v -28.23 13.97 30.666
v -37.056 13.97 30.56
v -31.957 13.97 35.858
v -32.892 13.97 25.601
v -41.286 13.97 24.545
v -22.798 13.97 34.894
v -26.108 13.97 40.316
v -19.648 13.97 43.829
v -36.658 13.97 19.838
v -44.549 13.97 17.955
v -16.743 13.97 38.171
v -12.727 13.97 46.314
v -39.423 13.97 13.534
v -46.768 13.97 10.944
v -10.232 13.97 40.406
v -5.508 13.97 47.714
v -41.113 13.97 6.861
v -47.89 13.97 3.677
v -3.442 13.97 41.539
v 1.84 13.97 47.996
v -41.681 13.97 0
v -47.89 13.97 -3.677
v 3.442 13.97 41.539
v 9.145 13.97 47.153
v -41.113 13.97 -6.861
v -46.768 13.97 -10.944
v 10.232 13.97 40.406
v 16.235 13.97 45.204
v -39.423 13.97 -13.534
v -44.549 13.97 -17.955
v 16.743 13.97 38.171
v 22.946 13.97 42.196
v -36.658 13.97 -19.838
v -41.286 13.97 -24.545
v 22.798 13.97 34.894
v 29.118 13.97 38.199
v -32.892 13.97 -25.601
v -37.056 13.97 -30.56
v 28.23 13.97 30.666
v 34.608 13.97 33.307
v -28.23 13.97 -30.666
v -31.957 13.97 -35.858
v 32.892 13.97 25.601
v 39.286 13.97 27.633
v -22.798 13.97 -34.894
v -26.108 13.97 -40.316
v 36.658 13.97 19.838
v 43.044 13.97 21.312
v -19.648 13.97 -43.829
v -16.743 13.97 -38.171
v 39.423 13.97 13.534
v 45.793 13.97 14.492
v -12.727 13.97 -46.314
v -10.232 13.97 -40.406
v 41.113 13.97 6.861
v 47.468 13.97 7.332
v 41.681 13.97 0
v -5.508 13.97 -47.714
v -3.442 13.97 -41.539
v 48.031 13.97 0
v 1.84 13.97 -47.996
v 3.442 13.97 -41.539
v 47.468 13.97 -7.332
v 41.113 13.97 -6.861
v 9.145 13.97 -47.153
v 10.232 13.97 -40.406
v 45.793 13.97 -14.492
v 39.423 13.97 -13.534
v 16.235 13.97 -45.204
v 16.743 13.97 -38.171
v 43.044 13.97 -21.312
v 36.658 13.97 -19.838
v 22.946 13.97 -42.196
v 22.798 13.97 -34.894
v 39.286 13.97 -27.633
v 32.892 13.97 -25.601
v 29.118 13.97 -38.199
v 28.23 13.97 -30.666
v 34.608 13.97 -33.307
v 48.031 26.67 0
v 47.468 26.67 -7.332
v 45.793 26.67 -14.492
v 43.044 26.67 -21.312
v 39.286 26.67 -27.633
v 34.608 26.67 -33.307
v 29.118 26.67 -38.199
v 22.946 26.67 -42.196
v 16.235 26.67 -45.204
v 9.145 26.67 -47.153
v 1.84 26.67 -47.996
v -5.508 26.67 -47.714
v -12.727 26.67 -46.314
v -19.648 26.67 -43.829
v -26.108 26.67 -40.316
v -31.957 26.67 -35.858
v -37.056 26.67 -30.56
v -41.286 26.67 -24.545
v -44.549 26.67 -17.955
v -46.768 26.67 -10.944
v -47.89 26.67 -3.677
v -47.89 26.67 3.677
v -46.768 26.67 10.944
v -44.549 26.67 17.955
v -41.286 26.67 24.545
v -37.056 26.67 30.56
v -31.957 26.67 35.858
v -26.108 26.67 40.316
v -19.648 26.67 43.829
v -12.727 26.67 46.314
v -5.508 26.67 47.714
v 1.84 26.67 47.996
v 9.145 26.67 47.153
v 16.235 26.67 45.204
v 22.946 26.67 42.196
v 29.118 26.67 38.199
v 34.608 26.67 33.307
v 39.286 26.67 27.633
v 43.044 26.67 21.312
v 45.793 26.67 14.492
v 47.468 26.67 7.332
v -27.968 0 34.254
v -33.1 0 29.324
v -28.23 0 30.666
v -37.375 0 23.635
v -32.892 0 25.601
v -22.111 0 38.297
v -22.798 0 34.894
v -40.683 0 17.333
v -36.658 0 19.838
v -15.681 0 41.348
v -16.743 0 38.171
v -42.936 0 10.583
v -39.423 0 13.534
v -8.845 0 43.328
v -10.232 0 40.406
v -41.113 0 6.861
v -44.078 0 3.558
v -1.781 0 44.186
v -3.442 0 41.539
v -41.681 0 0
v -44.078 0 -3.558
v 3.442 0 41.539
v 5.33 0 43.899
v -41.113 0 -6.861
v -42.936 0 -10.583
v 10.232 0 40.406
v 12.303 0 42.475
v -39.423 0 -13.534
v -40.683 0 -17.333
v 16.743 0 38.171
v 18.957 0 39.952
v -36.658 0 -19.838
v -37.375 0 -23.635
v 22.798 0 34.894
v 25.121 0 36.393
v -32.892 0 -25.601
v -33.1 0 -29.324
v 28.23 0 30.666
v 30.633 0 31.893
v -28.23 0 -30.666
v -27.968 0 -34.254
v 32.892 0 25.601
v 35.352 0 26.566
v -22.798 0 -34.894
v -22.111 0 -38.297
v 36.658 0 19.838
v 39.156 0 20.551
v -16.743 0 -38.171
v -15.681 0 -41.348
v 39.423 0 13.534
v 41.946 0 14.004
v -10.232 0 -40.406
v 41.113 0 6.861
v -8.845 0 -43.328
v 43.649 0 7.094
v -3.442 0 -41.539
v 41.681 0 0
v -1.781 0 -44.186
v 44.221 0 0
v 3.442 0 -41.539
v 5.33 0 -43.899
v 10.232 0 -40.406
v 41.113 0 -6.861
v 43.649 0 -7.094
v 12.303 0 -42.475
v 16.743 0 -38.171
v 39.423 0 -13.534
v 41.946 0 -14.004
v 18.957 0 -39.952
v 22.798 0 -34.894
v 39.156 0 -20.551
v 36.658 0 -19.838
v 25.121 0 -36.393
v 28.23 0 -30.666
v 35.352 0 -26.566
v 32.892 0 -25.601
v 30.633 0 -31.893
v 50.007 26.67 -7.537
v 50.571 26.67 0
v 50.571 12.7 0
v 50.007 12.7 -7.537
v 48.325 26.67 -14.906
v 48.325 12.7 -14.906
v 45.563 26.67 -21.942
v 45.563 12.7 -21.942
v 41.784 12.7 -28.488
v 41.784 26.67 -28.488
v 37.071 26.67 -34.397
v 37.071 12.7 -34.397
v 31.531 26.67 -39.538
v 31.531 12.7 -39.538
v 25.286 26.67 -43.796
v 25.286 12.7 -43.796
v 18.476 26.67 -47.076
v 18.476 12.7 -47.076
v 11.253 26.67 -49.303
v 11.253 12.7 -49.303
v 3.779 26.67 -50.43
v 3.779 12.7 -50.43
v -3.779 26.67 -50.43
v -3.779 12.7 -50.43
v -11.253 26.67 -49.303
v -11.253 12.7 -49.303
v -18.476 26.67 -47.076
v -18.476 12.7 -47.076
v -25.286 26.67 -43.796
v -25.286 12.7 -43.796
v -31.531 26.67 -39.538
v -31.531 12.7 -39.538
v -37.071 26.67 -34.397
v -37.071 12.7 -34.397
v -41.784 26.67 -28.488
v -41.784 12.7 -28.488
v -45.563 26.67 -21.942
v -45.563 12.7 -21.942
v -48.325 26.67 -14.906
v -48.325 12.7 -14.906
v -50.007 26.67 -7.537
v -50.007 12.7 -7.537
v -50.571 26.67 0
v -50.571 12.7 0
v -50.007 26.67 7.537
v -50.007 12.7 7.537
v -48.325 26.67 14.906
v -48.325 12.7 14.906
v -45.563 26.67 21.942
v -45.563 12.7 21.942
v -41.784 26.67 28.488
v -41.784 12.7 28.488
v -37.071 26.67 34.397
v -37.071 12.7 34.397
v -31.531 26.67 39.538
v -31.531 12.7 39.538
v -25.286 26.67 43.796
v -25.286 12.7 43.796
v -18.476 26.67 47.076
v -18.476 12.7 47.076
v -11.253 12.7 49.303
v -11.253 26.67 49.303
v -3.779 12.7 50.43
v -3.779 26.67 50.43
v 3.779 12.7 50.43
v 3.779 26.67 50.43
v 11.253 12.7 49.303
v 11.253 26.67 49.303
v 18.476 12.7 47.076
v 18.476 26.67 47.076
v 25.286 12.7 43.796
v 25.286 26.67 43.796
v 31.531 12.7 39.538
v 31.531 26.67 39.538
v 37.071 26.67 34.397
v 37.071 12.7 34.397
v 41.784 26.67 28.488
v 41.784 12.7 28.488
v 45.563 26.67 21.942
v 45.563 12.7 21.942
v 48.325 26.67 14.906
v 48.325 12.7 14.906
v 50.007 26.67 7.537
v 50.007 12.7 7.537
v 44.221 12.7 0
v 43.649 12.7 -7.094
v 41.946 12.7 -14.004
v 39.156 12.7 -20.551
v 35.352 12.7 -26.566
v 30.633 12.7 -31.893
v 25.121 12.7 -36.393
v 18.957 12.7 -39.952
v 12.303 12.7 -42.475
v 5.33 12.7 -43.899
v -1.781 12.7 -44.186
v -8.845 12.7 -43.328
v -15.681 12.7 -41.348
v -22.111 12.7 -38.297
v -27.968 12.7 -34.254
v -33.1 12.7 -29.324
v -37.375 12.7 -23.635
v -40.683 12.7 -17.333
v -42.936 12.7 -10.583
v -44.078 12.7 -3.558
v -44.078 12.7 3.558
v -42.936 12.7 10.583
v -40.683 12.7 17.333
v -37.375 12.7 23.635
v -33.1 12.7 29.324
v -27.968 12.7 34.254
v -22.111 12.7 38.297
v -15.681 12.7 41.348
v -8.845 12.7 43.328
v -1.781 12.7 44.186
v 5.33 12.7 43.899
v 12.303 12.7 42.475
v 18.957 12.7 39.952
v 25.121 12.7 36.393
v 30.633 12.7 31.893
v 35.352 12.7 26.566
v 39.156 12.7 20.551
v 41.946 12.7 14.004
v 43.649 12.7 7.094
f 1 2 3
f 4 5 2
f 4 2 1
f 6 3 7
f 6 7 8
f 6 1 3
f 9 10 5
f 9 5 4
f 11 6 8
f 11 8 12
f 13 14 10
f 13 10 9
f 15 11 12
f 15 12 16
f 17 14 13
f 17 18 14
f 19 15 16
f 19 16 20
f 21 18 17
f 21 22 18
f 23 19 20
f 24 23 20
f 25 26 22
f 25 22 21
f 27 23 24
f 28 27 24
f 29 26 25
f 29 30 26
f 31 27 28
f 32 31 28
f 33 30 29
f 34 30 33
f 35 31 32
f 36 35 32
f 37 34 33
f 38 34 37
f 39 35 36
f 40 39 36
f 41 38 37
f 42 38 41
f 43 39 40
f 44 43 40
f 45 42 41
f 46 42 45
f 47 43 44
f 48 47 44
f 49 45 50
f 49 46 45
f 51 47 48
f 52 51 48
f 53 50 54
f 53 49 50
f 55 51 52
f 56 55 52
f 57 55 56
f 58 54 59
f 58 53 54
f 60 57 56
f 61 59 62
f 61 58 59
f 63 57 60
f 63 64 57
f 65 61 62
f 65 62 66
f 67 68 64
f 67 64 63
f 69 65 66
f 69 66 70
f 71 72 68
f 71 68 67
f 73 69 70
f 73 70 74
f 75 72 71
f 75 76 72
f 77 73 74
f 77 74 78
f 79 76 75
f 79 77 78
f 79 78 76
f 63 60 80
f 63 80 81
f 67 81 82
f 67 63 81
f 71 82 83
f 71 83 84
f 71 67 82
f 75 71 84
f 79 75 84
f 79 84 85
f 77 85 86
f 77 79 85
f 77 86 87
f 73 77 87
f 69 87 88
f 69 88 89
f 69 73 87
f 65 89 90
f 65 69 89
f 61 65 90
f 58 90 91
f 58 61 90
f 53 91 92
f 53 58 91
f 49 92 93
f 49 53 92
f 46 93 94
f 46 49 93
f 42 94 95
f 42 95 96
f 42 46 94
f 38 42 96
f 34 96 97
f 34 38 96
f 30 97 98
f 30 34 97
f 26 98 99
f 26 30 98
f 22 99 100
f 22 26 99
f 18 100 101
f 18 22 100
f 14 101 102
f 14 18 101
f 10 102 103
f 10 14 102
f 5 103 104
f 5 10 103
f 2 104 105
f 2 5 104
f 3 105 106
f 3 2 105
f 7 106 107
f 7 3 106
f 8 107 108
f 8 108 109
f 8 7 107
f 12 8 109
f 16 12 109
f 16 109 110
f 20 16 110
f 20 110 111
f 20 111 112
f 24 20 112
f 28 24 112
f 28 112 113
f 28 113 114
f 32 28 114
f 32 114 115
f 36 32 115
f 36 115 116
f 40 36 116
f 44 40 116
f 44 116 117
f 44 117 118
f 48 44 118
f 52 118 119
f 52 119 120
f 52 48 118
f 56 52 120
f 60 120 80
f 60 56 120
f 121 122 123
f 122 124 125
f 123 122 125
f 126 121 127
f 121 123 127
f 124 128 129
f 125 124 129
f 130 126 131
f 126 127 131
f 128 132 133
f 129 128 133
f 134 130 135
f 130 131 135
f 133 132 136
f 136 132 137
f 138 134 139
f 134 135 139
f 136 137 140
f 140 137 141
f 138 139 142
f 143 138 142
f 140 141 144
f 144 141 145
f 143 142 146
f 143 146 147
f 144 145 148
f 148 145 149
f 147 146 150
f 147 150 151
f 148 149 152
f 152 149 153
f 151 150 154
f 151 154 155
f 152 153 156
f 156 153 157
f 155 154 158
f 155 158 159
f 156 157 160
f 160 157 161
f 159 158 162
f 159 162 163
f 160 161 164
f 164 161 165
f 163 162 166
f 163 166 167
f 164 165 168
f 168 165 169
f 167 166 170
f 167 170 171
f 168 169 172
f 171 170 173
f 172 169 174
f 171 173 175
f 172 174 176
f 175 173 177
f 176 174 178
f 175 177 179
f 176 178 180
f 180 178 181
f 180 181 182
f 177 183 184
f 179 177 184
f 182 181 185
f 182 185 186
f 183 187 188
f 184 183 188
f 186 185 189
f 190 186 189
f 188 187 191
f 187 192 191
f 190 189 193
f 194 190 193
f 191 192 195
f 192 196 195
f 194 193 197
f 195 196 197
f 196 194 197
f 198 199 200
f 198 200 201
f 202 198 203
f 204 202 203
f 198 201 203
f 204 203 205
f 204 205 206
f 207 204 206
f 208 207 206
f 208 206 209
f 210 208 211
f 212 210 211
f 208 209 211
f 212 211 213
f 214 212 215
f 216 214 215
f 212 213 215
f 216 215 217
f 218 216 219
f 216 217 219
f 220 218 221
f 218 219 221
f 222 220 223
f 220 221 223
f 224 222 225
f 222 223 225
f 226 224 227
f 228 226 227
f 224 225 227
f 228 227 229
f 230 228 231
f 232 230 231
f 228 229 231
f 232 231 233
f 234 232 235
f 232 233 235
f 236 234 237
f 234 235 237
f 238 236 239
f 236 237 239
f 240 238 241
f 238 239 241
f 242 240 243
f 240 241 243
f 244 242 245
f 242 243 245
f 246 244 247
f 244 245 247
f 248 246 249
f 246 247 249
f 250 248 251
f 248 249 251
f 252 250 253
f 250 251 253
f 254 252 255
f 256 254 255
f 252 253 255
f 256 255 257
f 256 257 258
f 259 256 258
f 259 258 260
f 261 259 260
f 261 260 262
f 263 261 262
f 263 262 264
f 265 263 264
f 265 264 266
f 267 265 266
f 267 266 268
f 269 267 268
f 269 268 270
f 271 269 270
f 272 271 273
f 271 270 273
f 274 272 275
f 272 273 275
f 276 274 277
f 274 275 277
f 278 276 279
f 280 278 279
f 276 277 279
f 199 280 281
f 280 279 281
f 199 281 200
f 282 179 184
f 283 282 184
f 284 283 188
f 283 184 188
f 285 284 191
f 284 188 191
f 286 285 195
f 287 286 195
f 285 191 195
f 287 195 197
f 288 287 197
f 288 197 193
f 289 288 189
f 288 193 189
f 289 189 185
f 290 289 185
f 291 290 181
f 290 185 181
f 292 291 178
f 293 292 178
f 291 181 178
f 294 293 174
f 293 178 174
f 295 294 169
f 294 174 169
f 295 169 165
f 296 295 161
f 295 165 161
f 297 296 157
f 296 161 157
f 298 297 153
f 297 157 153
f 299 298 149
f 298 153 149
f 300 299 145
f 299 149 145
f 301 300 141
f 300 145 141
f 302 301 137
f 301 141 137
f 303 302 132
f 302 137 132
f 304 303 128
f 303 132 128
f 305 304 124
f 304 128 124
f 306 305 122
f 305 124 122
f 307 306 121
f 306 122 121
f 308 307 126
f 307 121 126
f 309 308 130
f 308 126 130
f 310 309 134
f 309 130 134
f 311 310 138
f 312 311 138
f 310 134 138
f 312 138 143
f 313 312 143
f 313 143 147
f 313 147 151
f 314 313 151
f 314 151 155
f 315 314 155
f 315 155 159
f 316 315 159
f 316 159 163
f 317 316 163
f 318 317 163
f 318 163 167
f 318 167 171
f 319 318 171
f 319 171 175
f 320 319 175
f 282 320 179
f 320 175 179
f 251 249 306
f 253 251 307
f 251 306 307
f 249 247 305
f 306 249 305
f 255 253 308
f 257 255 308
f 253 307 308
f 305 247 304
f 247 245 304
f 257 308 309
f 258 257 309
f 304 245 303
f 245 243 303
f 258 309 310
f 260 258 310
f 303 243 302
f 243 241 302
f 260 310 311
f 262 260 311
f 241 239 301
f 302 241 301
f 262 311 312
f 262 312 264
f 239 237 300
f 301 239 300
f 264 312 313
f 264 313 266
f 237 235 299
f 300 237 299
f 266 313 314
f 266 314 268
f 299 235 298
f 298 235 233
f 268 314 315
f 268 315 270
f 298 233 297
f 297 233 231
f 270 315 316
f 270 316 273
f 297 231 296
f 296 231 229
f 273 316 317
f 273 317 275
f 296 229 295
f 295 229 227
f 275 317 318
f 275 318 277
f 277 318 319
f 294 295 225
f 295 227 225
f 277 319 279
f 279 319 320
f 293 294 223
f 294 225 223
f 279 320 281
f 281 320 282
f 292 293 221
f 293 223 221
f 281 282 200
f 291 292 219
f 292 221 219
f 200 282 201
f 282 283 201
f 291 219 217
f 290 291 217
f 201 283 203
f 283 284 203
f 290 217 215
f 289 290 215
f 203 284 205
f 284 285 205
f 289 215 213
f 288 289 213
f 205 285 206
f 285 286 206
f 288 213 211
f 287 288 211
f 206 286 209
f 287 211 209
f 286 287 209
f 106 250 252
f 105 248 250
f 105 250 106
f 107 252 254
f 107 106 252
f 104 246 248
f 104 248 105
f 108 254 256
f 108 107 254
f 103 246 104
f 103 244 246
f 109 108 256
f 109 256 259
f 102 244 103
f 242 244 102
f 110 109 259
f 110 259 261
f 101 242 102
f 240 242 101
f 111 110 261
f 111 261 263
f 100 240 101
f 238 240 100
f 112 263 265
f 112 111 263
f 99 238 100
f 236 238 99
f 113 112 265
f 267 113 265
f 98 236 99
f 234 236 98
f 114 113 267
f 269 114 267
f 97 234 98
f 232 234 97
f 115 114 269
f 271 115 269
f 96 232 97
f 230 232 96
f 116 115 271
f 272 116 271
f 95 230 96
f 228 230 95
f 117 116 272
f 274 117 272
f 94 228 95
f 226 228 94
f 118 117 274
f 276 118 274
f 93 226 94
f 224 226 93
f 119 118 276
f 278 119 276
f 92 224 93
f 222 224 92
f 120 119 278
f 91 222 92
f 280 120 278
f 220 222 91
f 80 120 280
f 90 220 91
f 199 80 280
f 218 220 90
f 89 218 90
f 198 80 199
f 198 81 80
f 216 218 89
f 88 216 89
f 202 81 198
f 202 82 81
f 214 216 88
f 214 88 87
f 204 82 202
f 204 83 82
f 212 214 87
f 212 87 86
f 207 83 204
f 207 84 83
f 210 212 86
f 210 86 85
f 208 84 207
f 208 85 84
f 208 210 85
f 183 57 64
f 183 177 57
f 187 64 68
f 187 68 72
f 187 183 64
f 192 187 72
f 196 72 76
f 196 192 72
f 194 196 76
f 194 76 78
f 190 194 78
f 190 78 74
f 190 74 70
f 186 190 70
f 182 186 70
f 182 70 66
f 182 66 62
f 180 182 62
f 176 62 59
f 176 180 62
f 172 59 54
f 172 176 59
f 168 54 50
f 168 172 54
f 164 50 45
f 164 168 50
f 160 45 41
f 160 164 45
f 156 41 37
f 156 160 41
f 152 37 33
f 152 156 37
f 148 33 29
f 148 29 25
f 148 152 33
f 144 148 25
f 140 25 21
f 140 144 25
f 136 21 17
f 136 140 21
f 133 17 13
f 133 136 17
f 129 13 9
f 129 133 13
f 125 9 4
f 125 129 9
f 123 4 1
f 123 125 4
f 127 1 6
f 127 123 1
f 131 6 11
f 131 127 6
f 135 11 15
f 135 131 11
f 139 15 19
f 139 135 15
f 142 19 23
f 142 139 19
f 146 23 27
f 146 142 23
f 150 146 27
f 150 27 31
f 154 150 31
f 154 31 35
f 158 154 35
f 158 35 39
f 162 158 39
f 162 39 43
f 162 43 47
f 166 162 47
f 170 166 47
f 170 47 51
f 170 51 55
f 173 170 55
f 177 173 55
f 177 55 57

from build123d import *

# Parameters (mm, degrees)
SKETCH1_R           = 44.2214
SKETCH1_R_2         = 41.6814
BOSS_EXTRUDE1_DEPTH = 12.7
SKETCH2_R           = 50.5714
SKETCH2_R_2         = 41.6814
BOSS_EXTRUDE2_DEPTH = 1.27
SKETCH3_R           = 50.5714
SKETCH3_R_2         = 48.0314
BOSS_EXTRUDE3_DEPTH = 12.7


with BuildPart() as part:
    # Sketch1 → Boss-Extrude1 (new body)
    with BuildSketch(Plane(origin=(0, 0, 0), x_dir=(1, 0, 0), z_dir=(0, 1, 0))):
        Circle(SKETCH1_R)
        Circle(SKETCH1_R_2, mode=Mode.SUBTRACT)
    extrude(amount=BOSS_EXTRUDE1_DEPTH)

    # Sketch2 → Boss-Extrude2 (add)
    with BuildSketch(Plane(origin=(0, 12.7, 0), x_dir=(1, 0, 0), z_dir=(0, 1, 0))):
        Circle(SKETCH2_R)
        Circle(SKETCH2_R_2, mode=Mode.SUBTRACT)
    extrude(amount=BOSS_EXTRUDE2_DEPTH)

    # Sketch3 → Boss-Extrude3 (add)
    with BuildSketch(Plane(origin=(0, 13.97, 0), x_dir=(1, 0, 0), z_dir=(0, 1, 0))):
        Circle(SKETCH3_R)
        Circle(SKETCH3_R_2, mode=Mode.SUBTRACT)
    extrude(amount=BOSS_EXTRUDE3_DEPTH)


solid = part.part
